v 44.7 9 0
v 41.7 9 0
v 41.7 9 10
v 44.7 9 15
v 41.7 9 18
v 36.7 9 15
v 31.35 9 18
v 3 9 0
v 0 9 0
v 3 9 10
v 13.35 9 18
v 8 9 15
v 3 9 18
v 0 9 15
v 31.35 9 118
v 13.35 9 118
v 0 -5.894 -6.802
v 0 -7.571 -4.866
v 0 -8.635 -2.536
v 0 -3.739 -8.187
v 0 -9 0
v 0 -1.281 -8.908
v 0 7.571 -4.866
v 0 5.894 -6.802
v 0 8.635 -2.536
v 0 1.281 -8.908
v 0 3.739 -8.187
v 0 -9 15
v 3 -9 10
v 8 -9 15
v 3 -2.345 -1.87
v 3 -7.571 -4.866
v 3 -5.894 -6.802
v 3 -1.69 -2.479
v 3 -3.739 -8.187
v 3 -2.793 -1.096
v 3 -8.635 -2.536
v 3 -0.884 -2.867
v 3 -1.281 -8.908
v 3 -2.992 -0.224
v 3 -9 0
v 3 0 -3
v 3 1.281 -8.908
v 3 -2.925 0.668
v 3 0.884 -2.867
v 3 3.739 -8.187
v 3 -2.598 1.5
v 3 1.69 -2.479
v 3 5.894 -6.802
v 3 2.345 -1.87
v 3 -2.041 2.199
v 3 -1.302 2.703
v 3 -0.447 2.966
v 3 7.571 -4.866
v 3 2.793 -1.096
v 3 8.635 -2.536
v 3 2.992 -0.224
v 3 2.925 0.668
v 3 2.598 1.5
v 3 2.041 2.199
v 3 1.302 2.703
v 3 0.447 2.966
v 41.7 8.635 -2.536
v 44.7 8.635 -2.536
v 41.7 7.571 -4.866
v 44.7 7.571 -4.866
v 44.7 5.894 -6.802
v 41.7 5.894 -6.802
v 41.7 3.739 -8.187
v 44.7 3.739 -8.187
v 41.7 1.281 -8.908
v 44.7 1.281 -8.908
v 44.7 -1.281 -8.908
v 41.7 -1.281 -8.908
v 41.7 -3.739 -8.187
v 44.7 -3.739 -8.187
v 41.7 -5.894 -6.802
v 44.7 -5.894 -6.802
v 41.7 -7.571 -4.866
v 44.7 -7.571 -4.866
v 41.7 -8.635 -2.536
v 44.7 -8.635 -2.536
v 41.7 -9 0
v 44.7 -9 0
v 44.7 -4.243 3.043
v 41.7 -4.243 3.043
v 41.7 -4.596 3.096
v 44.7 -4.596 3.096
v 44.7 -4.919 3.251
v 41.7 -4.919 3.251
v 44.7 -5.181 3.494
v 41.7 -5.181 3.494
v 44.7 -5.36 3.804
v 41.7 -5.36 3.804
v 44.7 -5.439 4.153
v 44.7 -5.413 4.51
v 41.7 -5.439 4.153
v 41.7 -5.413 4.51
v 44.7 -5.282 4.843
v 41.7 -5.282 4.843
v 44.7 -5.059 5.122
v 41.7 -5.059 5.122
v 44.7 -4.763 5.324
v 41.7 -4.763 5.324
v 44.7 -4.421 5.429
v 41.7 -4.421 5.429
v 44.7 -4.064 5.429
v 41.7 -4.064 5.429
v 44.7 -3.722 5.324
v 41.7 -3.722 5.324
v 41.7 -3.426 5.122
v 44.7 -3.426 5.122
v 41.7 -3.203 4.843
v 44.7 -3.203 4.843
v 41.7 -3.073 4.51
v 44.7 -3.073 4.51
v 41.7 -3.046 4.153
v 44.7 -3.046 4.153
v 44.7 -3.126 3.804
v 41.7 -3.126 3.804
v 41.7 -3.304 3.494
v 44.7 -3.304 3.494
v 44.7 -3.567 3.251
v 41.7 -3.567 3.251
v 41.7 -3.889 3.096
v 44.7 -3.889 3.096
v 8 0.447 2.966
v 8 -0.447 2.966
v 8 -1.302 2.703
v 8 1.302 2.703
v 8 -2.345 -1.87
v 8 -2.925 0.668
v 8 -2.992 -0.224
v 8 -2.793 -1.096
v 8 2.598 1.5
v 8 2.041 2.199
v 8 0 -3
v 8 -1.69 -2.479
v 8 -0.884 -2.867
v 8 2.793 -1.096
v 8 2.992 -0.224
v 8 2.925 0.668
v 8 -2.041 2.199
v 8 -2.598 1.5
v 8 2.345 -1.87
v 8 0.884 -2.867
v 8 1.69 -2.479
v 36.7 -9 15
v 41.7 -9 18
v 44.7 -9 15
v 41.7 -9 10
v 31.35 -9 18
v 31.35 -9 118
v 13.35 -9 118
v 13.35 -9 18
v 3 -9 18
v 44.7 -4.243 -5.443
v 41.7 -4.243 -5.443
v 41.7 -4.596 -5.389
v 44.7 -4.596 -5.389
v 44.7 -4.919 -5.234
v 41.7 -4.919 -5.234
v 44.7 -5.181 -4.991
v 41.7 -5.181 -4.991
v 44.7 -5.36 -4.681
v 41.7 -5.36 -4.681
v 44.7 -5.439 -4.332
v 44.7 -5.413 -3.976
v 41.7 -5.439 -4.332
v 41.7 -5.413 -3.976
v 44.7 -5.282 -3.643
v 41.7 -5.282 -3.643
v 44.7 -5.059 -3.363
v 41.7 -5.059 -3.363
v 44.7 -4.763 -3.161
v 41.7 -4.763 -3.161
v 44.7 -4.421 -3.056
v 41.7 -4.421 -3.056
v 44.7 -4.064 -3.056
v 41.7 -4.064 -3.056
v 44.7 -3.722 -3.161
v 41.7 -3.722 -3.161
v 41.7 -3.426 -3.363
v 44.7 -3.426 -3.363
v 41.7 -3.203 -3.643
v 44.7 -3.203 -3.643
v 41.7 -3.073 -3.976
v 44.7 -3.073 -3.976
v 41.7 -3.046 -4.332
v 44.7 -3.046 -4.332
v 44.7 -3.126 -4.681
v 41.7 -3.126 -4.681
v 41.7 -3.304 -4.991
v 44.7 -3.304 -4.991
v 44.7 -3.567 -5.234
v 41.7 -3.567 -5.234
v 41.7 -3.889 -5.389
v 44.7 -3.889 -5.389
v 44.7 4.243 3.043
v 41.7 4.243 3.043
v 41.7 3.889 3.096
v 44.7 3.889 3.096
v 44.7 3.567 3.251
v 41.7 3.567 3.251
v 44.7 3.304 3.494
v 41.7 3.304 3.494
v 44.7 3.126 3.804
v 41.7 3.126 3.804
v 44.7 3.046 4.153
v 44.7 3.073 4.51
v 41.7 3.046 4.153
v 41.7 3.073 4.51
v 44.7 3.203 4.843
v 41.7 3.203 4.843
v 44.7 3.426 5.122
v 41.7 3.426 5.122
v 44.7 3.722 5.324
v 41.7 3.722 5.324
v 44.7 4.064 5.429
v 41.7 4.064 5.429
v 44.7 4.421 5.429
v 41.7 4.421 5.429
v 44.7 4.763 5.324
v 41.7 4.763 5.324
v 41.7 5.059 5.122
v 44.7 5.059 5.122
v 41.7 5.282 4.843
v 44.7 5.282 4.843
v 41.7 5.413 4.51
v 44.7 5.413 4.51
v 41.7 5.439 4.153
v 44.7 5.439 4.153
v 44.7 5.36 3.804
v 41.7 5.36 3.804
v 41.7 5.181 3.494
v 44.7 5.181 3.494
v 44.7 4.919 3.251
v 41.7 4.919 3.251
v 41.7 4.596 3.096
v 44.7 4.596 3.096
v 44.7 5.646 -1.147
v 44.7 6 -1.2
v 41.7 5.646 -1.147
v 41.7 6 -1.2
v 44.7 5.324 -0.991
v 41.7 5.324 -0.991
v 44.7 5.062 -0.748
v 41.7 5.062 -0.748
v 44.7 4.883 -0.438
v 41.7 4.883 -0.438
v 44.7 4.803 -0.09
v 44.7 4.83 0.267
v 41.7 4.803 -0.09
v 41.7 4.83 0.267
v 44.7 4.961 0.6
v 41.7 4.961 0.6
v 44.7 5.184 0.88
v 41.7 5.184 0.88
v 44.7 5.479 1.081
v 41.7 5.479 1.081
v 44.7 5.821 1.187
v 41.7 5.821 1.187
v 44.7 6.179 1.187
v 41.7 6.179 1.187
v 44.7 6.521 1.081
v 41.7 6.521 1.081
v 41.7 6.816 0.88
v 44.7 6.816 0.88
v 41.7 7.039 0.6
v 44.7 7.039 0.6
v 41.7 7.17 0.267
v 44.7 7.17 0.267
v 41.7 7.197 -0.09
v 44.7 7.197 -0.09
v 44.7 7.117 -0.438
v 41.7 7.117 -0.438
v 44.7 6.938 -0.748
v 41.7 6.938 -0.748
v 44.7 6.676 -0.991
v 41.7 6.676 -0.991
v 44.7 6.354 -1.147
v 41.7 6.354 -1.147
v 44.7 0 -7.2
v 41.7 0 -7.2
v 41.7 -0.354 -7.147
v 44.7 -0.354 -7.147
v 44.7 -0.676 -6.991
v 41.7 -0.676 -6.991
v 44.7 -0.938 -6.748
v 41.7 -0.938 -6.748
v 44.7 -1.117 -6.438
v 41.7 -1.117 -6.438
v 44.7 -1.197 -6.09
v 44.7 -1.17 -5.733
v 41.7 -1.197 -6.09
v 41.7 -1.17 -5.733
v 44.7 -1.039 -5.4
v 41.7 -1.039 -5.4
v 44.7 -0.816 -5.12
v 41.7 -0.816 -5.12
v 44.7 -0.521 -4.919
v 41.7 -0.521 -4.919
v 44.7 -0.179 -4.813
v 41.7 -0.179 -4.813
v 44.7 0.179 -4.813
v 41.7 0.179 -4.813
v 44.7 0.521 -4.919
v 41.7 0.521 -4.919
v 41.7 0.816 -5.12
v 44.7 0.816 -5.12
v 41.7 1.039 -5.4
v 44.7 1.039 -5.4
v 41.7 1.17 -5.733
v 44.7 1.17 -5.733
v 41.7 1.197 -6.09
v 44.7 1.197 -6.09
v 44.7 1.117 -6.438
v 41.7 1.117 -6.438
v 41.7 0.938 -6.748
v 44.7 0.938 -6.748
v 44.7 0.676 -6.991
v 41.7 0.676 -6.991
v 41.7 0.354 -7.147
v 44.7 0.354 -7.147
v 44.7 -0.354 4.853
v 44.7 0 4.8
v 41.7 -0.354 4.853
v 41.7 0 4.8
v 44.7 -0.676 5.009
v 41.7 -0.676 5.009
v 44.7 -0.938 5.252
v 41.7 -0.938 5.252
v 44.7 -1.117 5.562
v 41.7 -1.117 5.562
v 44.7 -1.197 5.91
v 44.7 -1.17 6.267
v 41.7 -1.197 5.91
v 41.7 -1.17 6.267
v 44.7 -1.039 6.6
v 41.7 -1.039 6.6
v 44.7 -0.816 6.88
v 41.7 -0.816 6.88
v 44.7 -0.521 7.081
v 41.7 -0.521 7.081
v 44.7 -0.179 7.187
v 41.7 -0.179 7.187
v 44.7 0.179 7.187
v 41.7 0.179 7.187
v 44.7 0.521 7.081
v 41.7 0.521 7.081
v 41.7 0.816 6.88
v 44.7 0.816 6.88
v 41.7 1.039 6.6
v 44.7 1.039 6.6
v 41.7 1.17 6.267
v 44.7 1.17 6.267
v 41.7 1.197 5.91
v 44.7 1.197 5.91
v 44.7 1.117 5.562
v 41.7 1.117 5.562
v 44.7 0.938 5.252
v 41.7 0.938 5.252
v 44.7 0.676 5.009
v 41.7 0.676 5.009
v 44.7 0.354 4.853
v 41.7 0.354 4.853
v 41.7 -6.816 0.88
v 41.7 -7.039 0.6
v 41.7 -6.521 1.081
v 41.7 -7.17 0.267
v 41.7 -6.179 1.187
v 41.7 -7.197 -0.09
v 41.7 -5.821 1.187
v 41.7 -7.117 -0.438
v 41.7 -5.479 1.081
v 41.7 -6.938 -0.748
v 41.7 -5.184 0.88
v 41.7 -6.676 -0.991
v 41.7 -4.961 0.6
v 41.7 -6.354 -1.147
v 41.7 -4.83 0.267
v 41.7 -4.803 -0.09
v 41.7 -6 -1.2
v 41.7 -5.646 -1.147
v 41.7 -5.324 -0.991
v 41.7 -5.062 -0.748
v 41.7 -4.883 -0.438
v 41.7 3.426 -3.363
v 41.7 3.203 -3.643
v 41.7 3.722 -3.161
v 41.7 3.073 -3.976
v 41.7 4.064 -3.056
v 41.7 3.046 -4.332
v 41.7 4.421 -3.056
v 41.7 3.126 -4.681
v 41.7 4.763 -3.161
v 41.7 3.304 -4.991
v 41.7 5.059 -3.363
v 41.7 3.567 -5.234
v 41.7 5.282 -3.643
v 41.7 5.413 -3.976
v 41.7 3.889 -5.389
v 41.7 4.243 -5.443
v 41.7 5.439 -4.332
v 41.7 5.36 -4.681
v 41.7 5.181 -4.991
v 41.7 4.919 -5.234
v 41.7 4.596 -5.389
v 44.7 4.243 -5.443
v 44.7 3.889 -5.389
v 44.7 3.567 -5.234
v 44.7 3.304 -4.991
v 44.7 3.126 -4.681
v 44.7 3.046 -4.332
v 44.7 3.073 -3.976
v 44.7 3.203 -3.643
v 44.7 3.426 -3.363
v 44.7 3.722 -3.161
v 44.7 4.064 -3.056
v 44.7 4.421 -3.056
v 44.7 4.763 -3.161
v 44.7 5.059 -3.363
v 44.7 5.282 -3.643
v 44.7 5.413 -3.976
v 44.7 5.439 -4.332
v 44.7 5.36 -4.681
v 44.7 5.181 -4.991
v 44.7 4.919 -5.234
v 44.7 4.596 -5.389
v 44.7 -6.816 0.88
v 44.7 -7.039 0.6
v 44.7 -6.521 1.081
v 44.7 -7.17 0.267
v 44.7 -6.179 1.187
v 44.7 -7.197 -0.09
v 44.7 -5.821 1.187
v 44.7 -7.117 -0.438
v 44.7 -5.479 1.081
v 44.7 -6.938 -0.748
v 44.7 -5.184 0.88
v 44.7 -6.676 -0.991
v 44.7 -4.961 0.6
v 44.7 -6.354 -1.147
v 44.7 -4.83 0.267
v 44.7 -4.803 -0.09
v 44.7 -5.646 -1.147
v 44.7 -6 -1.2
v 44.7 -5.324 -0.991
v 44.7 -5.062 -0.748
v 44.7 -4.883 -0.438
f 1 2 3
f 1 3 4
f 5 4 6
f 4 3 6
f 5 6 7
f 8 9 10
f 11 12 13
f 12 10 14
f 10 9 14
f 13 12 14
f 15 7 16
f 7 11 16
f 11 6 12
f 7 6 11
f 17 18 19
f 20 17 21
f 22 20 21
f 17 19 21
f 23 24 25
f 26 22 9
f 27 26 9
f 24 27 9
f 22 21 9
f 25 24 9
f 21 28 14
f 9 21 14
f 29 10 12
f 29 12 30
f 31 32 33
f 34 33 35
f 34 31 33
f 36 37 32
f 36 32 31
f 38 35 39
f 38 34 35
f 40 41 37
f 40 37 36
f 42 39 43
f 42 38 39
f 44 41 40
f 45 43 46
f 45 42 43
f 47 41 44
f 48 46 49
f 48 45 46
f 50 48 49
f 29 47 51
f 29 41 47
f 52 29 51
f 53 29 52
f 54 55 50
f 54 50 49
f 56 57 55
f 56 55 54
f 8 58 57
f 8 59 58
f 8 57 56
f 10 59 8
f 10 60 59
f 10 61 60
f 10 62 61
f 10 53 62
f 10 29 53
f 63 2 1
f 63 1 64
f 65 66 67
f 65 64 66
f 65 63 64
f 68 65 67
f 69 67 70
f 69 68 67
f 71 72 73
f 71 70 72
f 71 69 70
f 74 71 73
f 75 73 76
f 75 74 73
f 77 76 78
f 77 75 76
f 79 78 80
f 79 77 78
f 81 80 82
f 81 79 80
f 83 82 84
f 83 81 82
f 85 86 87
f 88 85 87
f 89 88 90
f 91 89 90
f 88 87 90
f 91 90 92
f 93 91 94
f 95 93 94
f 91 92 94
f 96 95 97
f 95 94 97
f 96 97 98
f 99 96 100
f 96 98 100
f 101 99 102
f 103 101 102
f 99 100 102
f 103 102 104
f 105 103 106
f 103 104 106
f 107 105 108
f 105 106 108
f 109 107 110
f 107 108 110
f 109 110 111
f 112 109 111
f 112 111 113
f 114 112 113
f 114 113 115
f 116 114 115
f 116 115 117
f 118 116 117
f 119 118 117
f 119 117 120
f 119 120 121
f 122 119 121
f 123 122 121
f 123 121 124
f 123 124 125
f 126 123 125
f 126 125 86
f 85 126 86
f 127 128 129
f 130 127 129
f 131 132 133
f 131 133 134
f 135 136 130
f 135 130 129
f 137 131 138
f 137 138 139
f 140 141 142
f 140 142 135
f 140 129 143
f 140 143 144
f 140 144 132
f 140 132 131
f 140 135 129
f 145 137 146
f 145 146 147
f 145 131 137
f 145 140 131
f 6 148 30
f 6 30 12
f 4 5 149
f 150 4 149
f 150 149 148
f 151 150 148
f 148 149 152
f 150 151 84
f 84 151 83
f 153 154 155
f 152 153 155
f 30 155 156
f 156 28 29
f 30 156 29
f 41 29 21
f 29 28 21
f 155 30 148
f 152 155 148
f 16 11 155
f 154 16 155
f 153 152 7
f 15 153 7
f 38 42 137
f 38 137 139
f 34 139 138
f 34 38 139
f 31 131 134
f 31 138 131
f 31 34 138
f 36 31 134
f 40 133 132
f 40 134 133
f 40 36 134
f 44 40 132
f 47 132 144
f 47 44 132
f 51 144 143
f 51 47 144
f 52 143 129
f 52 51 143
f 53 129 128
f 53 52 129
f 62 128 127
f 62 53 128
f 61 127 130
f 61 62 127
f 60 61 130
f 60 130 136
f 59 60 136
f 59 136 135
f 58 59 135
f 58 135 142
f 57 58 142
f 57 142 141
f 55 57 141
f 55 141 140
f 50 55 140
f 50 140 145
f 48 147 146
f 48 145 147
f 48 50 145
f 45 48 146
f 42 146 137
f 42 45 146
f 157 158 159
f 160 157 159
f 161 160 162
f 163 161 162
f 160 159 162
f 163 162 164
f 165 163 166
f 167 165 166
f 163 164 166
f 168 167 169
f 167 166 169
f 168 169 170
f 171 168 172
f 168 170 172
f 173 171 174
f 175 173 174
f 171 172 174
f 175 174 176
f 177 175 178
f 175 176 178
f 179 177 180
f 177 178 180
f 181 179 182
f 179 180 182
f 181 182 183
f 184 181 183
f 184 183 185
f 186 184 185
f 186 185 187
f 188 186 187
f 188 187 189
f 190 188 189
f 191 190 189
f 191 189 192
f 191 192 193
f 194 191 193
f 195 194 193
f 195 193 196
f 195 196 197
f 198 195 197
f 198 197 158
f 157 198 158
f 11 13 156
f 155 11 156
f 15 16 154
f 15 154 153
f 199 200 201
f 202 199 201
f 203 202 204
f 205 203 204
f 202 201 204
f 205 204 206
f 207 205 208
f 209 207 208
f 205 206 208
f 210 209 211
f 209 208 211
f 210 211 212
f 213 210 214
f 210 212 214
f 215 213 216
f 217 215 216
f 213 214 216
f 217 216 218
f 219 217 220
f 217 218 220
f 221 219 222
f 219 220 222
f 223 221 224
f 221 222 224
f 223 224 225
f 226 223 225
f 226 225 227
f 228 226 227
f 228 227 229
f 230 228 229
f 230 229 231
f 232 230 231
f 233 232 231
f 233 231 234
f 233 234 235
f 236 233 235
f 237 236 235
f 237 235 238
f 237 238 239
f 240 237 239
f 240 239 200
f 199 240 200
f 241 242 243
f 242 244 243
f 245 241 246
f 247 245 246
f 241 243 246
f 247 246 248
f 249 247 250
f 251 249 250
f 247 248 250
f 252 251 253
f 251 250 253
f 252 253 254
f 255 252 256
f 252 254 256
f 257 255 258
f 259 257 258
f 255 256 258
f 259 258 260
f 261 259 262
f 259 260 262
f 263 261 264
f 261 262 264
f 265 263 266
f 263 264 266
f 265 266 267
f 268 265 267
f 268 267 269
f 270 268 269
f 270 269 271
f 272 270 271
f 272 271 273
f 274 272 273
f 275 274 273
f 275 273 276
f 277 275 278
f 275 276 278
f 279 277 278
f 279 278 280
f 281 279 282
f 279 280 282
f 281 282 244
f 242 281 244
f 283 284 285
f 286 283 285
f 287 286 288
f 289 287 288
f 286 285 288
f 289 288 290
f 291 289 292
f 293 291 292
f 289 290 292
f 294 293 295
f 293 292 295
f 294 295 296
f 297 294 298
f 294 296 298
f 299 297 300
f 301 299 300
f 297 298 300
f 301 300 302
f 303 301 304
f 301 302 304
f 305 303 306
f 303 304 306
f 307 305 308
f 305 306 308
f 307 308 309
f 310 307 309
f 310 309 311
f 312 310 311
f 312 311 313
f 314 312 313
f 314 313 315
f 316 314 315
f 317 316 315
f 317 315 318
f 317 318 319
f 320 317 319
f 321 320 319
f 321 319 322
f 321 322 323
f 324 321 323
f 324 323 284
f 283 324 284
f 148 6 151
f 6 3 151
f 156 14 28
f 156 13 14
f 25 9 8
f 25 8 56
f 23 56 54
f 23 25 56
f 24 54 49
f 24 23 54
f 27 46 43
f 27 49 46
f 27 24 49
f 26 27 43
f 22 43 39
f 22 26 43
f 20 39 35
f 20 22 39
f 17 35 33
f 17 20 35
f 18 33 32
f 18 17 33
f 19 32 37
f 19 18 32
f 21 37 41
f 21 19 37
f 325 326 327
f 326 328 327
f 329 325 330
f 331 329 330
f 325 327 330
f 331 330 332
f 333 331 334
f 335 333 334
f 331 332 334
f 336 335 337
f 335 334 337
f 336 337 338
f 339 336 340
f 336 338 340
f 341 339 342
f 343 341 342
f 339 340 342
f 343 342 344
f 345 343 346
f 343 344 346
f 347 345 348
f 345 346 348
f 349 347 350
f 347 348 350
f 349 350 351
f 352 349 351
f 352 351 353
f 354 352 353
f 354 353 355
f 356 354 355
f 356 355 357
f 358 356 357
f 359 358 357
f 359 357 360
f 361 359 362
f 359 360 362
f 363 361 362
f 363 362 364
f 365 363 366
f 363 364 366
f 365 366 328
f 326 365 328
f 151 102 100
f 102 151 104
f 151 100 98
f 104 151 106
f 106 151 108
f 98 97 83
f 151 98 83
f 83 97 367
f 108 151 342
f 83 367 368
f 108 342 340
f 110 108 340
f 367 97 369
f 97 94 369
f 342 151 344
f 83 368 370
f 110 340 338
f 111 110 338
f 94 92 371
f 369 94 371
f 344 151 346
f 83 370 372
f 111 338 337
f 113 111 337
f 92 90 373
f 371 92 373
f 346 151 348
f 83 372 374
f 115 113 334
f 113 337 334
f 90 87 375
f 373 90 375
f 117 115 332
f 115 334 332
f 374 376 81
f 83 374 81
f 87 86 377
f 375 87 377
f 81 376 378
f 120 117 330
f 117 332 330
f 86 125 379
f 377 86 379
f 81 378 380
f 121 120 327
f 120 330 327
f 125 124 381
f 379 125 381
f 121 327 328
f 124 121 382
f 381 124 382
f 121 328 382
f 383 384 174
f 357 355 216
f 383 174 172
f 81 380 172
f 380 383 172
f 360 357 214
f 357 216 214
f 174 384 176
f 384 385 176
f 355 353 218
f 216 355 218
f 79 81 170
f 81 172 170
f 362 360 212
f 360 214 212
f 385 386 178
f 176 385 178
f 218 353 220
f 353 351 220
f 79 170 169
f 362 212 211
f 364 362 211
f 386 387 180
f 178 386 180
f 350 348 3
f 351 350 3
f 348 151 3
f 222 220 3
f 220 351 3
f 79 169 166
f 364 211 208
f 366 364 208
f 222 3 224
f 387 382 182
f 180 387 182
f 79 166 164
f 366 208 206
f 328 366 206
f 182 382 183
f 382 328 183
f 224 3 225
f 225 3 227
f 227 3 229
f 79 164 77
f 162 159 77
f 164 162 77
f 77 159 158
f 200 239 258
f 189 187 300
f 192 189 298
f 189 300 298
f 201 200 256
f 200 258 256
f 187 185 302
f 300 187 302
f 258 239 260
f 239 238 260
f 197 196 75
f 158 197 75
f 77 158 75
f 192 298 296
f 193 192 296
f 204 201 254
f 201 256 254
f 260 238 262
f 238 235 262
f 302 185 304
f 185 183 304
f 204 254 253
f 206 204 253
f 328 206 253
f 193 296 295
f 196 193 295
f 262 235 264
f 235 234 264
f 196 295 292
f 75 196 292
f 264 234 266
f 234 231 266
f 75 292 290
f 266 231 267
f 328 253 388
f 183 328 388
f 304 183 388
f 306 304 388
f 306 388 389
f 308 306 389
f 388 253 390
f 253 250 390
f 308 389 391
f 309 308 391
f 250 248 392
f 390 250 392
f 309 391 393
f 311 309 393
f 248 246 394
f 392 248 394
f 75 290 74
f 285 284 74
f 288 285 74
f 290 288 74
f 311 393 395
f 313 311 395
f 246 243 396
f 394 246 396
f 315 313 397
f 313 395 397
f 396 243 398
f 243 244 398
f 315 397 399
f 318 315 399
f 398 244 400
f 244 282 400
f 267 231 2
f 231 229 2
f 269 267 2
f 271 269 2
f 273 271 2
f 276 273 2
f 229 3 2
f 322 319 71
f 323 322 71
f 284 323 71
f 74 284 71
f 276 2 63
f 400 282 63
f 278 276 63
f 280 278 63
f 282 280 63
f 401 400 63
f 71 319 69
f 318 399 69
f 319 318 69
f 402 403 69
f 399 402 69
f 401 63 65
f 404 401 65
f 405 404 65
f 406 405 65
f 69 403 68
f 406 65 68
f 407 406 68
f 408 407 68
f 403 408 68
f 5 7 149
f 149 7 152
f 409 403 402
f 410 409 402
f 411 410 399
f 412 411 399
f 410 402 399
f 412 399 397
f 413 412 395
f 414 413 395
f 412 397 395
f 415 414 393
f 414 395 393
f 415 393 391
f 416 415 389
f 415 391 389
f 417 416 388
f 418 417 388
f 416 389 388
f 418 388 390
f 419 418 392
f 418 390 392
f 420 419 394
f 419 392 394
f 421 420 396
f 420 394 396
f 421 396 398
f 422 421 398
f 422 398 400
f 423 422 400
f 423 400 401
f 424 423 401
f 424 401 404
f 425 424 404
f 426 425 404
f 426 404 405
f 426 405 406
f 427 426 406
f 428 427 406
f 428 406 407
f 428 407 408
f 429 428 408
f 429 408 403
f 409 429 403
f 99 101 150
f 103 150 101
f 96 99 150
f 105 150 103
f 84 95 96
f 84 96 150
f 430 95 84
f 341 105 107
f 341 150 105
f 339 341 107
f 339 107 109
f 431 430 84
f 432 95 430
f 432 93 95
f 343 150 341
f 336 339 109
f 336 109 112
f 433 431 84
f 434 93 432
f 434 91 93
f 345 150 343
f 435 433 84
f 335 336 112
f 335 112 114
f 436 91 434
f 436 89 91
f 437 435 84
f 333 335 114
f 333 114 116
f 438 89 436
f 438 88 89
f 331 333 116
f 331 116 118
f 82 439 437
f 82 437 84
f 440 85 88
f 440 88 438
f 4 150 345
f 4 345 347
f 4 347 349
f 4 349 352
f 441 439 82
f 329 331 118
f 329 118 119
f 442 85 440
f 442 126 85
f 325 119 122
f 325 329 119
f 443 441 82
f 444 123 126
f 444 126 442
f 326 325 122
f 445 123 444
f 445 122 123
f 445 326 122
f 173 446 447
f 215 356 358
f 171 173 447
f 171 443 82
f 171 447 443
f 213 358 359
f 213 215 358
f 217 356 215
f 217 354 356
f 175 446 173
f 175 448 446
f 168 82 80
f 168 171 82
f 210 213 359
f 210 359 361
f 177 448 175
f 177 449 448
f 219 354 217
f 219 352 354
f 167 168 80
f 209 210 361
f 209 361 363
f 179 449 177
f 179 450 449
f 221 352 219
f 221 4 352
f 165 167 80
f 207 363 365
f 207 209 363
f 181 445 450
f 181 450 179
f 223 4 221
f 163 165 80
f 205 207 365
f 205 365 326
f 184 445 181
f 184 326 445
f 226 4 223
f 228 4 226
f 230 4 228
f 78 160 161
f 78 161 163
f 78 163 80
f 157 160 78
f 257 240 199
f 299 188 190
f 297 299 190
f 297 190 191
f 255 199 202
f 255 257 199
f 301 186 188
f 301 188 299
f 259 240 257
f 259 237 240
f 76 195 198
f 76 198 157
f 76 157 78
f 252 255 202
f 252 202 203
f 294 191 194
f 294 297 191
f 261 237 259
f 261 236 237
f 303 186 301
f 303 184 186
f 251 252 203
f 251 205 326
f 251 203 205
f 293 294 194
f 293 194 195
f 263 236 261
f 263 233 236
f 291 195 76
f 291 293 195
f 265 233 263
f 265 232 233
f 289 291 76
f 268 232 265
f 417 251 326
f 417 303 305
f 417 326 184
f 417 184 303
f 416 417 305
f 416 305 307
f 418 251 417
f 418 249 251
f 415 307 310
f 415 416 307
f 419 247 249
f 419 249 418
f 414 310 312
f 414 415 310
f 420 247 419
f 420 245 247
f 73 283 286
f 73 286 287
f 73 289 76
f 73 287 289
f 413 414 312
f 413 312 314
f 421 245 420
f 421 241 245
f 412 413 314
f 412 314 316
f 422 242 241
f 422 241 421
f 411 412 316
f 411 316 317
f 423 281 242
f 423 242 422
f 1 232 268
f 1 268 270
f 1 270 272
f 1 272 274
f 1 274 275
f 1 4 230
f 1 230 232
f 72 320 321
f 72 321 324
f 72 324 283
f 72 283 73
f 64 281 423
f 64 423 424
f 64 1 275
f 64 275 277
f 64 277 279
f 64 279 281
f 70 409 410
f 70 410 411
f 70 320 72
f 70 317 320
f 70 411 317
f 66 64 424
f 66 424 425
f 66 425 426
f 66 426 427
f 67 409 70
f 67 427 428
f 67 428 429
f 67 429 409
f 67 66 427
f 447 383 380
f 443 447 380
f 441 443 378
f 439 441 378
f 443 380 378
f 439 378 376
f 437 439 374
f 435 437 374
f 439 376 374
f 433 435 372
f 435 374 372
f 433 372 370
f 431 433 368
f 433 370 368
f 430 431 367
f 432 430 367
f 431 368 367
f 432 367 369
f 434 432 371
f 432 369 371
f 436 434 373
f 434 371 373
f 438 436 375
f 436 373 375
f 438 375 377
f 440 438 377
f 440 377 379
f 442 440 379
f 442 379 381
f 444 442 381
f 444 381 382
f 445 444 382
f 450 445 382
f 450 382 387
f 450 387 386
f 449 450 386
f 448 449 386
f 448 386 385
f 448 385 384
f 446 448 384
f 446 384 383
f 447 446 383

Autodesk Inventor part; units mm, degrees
ref_plane "YZ Plane" through (0, 0, 0) normal (1, 0, 0) x (0, 1, 0)
ref_plane "XZ Plane" through (0, 0, 0) normal (0, 1, 0) x (-1, 0, 0)
ref_plane "XY Plane" through (0, 0, 0) normal (0, 0, 1) x (1, 0, 0)
sketch "スケッチ1" plane through (0, 0, 0) normal (1, 0, 0) x (0, 1, 0)
  circle A0 centre (0, 0) radius 9
  line L0 (9, 0) -> (-9, 0)
  line L1 (-9, 0) -> (-9, 18)
  line L2 (-9, 18) -> (9, 18)
  line L3 (9, 18) -> (9, 0)
  dimension "d0" = 18
  dimension "d1" = 18
  dimension "d2" = 18
extrude "押し出し1" add sketch "スケッチ1" along normal blind 3
sketch "スケッチ2" plane through (3, 0, 0) normal (1, 0, 0) x (0, 0, -1)
  line L0 (-18, 9) -> (-18, -9) projected
  line L1 (-18, -9) -> (-15, -9)
  line L2 (-15, -9) -> (-15, 9)
  line L3 (-15, 9) -> (-18, 9)
  line L4 (-18, 9) -> (-18, -9)
  line L5 (0, 9) -> (-18, 9) projected
  point P0 (0, 0)
  dimension "d5" = 3
extrude "押し出し2" add sketch "スケッチ2" along normal blind 38.7
sketch "スケッチ3" plane through (41.7, 0, 0) normal (1, 0, 0) x (0, 0, -1)
  line L0 (-15, 9) -> (-15, -9) projected
  line L1 (-15, -9) -> (0, -9) projected
  arc A0 (0, -9) -> (0, 9) centre (0, 0) ccw projected
  line L2 (0, 9) -> (-15, 9) projected
  line L3 (-15, -9) -> (-15, 9) projected
  line L4 (-15, 9) -> (-18, 9) projected
  line L5 (-18, 9) -> (-18, -9) projected
  line L6 (-18, -9) -> (-15, -9) projected
extrude "押し出し3" add sketch "スケッチ3" along normal blind 3
sketch "スケッチ7" plane through (0, -9, 18) normal (0, 0, 1) x (1, 0, 0)
  line L0 (3, 0) -> (41.7, 0) projected
  line L1 (31.35, 18) -> (13.35, 18)
  line L2 (13.35, 18) -> (13.35, 0)
  line L3 (13.35, 0) -> (31.35, 0)
  line L4 (31.35, 0) -> (31.35, 18)
  line L5 (31.35, 18) -> (13.35, 0) construction
  line L6 (13.35, 18) -> (31.35, 0) construction
  line L7 (0, 18) -> (44.7, 18) projected
  line L8 (44.7, 18) -> (44.7, 0) projected
  point P0 (0, 9)
  point P1 (22.35, 9)
  point P2 (31.35, 0)
  dimension "d23" = 18
  dimension "d24" = 22.35
extrude "押し出し7" add sketch "スケッチ7" along normal blind 100
sketch "スケッチ8" plane through (44.7, 0, 0) normal (1, 0, 0) x (0, 0, -1)
  circle A0 centre (0, 0) radius 6 construction
  line L0 (7.1439, 0) -> (-7.1439, 0) construction
  point P0 (-6, 0)
  point P1 (-4.2426, -4.2426)
  point P2 (0, -6)
  point P3 (4.2426, -4.2426)
  point P4 (6, 0)
  point P5 (4.2426, 4.2426)
  point P6 (0, 6)
  point P7 (-4.2426, 4.2426)
  dimension "d27" = 12
  dimension "d30" = 360
hole "穴1" at (44.7, 0, 6) at (44.7, -4.2426, 4.2426) at (44.7, -6, 0) at (44.7, -4.2426, -4.2426) at (44.7, 0, -6) at (44.7, 4.2426, -4.2426) at (44.7, 6, 0) at (44.7, 4.2426, 4.2426) direction (-1, 0, 0) diameter 2.4 depth 6.3 clearance for "Countersunk Flat Head Screw ISO 2009/7046" size "M2" standard "ISO"
sketch "スケッチ9" plane through (3, 0, 0) normal (1, 0, 0) x (0, 0, -1)
  circle A0 centre (0, 0) radius 3
  dimension "d39" = 6
extrude "押し出し8" add sketch "スケッチ9" along normal blind 5
chamfer "面取り1" distance 5 angle 45 2 edges at (3, 0, 15) (41.7, 0, 15)
chamfer "面取り2" distance 3 angle 45 2 edges at (0, 0, 18) (44.7, 0, 18)
properties part number "Arm2"
